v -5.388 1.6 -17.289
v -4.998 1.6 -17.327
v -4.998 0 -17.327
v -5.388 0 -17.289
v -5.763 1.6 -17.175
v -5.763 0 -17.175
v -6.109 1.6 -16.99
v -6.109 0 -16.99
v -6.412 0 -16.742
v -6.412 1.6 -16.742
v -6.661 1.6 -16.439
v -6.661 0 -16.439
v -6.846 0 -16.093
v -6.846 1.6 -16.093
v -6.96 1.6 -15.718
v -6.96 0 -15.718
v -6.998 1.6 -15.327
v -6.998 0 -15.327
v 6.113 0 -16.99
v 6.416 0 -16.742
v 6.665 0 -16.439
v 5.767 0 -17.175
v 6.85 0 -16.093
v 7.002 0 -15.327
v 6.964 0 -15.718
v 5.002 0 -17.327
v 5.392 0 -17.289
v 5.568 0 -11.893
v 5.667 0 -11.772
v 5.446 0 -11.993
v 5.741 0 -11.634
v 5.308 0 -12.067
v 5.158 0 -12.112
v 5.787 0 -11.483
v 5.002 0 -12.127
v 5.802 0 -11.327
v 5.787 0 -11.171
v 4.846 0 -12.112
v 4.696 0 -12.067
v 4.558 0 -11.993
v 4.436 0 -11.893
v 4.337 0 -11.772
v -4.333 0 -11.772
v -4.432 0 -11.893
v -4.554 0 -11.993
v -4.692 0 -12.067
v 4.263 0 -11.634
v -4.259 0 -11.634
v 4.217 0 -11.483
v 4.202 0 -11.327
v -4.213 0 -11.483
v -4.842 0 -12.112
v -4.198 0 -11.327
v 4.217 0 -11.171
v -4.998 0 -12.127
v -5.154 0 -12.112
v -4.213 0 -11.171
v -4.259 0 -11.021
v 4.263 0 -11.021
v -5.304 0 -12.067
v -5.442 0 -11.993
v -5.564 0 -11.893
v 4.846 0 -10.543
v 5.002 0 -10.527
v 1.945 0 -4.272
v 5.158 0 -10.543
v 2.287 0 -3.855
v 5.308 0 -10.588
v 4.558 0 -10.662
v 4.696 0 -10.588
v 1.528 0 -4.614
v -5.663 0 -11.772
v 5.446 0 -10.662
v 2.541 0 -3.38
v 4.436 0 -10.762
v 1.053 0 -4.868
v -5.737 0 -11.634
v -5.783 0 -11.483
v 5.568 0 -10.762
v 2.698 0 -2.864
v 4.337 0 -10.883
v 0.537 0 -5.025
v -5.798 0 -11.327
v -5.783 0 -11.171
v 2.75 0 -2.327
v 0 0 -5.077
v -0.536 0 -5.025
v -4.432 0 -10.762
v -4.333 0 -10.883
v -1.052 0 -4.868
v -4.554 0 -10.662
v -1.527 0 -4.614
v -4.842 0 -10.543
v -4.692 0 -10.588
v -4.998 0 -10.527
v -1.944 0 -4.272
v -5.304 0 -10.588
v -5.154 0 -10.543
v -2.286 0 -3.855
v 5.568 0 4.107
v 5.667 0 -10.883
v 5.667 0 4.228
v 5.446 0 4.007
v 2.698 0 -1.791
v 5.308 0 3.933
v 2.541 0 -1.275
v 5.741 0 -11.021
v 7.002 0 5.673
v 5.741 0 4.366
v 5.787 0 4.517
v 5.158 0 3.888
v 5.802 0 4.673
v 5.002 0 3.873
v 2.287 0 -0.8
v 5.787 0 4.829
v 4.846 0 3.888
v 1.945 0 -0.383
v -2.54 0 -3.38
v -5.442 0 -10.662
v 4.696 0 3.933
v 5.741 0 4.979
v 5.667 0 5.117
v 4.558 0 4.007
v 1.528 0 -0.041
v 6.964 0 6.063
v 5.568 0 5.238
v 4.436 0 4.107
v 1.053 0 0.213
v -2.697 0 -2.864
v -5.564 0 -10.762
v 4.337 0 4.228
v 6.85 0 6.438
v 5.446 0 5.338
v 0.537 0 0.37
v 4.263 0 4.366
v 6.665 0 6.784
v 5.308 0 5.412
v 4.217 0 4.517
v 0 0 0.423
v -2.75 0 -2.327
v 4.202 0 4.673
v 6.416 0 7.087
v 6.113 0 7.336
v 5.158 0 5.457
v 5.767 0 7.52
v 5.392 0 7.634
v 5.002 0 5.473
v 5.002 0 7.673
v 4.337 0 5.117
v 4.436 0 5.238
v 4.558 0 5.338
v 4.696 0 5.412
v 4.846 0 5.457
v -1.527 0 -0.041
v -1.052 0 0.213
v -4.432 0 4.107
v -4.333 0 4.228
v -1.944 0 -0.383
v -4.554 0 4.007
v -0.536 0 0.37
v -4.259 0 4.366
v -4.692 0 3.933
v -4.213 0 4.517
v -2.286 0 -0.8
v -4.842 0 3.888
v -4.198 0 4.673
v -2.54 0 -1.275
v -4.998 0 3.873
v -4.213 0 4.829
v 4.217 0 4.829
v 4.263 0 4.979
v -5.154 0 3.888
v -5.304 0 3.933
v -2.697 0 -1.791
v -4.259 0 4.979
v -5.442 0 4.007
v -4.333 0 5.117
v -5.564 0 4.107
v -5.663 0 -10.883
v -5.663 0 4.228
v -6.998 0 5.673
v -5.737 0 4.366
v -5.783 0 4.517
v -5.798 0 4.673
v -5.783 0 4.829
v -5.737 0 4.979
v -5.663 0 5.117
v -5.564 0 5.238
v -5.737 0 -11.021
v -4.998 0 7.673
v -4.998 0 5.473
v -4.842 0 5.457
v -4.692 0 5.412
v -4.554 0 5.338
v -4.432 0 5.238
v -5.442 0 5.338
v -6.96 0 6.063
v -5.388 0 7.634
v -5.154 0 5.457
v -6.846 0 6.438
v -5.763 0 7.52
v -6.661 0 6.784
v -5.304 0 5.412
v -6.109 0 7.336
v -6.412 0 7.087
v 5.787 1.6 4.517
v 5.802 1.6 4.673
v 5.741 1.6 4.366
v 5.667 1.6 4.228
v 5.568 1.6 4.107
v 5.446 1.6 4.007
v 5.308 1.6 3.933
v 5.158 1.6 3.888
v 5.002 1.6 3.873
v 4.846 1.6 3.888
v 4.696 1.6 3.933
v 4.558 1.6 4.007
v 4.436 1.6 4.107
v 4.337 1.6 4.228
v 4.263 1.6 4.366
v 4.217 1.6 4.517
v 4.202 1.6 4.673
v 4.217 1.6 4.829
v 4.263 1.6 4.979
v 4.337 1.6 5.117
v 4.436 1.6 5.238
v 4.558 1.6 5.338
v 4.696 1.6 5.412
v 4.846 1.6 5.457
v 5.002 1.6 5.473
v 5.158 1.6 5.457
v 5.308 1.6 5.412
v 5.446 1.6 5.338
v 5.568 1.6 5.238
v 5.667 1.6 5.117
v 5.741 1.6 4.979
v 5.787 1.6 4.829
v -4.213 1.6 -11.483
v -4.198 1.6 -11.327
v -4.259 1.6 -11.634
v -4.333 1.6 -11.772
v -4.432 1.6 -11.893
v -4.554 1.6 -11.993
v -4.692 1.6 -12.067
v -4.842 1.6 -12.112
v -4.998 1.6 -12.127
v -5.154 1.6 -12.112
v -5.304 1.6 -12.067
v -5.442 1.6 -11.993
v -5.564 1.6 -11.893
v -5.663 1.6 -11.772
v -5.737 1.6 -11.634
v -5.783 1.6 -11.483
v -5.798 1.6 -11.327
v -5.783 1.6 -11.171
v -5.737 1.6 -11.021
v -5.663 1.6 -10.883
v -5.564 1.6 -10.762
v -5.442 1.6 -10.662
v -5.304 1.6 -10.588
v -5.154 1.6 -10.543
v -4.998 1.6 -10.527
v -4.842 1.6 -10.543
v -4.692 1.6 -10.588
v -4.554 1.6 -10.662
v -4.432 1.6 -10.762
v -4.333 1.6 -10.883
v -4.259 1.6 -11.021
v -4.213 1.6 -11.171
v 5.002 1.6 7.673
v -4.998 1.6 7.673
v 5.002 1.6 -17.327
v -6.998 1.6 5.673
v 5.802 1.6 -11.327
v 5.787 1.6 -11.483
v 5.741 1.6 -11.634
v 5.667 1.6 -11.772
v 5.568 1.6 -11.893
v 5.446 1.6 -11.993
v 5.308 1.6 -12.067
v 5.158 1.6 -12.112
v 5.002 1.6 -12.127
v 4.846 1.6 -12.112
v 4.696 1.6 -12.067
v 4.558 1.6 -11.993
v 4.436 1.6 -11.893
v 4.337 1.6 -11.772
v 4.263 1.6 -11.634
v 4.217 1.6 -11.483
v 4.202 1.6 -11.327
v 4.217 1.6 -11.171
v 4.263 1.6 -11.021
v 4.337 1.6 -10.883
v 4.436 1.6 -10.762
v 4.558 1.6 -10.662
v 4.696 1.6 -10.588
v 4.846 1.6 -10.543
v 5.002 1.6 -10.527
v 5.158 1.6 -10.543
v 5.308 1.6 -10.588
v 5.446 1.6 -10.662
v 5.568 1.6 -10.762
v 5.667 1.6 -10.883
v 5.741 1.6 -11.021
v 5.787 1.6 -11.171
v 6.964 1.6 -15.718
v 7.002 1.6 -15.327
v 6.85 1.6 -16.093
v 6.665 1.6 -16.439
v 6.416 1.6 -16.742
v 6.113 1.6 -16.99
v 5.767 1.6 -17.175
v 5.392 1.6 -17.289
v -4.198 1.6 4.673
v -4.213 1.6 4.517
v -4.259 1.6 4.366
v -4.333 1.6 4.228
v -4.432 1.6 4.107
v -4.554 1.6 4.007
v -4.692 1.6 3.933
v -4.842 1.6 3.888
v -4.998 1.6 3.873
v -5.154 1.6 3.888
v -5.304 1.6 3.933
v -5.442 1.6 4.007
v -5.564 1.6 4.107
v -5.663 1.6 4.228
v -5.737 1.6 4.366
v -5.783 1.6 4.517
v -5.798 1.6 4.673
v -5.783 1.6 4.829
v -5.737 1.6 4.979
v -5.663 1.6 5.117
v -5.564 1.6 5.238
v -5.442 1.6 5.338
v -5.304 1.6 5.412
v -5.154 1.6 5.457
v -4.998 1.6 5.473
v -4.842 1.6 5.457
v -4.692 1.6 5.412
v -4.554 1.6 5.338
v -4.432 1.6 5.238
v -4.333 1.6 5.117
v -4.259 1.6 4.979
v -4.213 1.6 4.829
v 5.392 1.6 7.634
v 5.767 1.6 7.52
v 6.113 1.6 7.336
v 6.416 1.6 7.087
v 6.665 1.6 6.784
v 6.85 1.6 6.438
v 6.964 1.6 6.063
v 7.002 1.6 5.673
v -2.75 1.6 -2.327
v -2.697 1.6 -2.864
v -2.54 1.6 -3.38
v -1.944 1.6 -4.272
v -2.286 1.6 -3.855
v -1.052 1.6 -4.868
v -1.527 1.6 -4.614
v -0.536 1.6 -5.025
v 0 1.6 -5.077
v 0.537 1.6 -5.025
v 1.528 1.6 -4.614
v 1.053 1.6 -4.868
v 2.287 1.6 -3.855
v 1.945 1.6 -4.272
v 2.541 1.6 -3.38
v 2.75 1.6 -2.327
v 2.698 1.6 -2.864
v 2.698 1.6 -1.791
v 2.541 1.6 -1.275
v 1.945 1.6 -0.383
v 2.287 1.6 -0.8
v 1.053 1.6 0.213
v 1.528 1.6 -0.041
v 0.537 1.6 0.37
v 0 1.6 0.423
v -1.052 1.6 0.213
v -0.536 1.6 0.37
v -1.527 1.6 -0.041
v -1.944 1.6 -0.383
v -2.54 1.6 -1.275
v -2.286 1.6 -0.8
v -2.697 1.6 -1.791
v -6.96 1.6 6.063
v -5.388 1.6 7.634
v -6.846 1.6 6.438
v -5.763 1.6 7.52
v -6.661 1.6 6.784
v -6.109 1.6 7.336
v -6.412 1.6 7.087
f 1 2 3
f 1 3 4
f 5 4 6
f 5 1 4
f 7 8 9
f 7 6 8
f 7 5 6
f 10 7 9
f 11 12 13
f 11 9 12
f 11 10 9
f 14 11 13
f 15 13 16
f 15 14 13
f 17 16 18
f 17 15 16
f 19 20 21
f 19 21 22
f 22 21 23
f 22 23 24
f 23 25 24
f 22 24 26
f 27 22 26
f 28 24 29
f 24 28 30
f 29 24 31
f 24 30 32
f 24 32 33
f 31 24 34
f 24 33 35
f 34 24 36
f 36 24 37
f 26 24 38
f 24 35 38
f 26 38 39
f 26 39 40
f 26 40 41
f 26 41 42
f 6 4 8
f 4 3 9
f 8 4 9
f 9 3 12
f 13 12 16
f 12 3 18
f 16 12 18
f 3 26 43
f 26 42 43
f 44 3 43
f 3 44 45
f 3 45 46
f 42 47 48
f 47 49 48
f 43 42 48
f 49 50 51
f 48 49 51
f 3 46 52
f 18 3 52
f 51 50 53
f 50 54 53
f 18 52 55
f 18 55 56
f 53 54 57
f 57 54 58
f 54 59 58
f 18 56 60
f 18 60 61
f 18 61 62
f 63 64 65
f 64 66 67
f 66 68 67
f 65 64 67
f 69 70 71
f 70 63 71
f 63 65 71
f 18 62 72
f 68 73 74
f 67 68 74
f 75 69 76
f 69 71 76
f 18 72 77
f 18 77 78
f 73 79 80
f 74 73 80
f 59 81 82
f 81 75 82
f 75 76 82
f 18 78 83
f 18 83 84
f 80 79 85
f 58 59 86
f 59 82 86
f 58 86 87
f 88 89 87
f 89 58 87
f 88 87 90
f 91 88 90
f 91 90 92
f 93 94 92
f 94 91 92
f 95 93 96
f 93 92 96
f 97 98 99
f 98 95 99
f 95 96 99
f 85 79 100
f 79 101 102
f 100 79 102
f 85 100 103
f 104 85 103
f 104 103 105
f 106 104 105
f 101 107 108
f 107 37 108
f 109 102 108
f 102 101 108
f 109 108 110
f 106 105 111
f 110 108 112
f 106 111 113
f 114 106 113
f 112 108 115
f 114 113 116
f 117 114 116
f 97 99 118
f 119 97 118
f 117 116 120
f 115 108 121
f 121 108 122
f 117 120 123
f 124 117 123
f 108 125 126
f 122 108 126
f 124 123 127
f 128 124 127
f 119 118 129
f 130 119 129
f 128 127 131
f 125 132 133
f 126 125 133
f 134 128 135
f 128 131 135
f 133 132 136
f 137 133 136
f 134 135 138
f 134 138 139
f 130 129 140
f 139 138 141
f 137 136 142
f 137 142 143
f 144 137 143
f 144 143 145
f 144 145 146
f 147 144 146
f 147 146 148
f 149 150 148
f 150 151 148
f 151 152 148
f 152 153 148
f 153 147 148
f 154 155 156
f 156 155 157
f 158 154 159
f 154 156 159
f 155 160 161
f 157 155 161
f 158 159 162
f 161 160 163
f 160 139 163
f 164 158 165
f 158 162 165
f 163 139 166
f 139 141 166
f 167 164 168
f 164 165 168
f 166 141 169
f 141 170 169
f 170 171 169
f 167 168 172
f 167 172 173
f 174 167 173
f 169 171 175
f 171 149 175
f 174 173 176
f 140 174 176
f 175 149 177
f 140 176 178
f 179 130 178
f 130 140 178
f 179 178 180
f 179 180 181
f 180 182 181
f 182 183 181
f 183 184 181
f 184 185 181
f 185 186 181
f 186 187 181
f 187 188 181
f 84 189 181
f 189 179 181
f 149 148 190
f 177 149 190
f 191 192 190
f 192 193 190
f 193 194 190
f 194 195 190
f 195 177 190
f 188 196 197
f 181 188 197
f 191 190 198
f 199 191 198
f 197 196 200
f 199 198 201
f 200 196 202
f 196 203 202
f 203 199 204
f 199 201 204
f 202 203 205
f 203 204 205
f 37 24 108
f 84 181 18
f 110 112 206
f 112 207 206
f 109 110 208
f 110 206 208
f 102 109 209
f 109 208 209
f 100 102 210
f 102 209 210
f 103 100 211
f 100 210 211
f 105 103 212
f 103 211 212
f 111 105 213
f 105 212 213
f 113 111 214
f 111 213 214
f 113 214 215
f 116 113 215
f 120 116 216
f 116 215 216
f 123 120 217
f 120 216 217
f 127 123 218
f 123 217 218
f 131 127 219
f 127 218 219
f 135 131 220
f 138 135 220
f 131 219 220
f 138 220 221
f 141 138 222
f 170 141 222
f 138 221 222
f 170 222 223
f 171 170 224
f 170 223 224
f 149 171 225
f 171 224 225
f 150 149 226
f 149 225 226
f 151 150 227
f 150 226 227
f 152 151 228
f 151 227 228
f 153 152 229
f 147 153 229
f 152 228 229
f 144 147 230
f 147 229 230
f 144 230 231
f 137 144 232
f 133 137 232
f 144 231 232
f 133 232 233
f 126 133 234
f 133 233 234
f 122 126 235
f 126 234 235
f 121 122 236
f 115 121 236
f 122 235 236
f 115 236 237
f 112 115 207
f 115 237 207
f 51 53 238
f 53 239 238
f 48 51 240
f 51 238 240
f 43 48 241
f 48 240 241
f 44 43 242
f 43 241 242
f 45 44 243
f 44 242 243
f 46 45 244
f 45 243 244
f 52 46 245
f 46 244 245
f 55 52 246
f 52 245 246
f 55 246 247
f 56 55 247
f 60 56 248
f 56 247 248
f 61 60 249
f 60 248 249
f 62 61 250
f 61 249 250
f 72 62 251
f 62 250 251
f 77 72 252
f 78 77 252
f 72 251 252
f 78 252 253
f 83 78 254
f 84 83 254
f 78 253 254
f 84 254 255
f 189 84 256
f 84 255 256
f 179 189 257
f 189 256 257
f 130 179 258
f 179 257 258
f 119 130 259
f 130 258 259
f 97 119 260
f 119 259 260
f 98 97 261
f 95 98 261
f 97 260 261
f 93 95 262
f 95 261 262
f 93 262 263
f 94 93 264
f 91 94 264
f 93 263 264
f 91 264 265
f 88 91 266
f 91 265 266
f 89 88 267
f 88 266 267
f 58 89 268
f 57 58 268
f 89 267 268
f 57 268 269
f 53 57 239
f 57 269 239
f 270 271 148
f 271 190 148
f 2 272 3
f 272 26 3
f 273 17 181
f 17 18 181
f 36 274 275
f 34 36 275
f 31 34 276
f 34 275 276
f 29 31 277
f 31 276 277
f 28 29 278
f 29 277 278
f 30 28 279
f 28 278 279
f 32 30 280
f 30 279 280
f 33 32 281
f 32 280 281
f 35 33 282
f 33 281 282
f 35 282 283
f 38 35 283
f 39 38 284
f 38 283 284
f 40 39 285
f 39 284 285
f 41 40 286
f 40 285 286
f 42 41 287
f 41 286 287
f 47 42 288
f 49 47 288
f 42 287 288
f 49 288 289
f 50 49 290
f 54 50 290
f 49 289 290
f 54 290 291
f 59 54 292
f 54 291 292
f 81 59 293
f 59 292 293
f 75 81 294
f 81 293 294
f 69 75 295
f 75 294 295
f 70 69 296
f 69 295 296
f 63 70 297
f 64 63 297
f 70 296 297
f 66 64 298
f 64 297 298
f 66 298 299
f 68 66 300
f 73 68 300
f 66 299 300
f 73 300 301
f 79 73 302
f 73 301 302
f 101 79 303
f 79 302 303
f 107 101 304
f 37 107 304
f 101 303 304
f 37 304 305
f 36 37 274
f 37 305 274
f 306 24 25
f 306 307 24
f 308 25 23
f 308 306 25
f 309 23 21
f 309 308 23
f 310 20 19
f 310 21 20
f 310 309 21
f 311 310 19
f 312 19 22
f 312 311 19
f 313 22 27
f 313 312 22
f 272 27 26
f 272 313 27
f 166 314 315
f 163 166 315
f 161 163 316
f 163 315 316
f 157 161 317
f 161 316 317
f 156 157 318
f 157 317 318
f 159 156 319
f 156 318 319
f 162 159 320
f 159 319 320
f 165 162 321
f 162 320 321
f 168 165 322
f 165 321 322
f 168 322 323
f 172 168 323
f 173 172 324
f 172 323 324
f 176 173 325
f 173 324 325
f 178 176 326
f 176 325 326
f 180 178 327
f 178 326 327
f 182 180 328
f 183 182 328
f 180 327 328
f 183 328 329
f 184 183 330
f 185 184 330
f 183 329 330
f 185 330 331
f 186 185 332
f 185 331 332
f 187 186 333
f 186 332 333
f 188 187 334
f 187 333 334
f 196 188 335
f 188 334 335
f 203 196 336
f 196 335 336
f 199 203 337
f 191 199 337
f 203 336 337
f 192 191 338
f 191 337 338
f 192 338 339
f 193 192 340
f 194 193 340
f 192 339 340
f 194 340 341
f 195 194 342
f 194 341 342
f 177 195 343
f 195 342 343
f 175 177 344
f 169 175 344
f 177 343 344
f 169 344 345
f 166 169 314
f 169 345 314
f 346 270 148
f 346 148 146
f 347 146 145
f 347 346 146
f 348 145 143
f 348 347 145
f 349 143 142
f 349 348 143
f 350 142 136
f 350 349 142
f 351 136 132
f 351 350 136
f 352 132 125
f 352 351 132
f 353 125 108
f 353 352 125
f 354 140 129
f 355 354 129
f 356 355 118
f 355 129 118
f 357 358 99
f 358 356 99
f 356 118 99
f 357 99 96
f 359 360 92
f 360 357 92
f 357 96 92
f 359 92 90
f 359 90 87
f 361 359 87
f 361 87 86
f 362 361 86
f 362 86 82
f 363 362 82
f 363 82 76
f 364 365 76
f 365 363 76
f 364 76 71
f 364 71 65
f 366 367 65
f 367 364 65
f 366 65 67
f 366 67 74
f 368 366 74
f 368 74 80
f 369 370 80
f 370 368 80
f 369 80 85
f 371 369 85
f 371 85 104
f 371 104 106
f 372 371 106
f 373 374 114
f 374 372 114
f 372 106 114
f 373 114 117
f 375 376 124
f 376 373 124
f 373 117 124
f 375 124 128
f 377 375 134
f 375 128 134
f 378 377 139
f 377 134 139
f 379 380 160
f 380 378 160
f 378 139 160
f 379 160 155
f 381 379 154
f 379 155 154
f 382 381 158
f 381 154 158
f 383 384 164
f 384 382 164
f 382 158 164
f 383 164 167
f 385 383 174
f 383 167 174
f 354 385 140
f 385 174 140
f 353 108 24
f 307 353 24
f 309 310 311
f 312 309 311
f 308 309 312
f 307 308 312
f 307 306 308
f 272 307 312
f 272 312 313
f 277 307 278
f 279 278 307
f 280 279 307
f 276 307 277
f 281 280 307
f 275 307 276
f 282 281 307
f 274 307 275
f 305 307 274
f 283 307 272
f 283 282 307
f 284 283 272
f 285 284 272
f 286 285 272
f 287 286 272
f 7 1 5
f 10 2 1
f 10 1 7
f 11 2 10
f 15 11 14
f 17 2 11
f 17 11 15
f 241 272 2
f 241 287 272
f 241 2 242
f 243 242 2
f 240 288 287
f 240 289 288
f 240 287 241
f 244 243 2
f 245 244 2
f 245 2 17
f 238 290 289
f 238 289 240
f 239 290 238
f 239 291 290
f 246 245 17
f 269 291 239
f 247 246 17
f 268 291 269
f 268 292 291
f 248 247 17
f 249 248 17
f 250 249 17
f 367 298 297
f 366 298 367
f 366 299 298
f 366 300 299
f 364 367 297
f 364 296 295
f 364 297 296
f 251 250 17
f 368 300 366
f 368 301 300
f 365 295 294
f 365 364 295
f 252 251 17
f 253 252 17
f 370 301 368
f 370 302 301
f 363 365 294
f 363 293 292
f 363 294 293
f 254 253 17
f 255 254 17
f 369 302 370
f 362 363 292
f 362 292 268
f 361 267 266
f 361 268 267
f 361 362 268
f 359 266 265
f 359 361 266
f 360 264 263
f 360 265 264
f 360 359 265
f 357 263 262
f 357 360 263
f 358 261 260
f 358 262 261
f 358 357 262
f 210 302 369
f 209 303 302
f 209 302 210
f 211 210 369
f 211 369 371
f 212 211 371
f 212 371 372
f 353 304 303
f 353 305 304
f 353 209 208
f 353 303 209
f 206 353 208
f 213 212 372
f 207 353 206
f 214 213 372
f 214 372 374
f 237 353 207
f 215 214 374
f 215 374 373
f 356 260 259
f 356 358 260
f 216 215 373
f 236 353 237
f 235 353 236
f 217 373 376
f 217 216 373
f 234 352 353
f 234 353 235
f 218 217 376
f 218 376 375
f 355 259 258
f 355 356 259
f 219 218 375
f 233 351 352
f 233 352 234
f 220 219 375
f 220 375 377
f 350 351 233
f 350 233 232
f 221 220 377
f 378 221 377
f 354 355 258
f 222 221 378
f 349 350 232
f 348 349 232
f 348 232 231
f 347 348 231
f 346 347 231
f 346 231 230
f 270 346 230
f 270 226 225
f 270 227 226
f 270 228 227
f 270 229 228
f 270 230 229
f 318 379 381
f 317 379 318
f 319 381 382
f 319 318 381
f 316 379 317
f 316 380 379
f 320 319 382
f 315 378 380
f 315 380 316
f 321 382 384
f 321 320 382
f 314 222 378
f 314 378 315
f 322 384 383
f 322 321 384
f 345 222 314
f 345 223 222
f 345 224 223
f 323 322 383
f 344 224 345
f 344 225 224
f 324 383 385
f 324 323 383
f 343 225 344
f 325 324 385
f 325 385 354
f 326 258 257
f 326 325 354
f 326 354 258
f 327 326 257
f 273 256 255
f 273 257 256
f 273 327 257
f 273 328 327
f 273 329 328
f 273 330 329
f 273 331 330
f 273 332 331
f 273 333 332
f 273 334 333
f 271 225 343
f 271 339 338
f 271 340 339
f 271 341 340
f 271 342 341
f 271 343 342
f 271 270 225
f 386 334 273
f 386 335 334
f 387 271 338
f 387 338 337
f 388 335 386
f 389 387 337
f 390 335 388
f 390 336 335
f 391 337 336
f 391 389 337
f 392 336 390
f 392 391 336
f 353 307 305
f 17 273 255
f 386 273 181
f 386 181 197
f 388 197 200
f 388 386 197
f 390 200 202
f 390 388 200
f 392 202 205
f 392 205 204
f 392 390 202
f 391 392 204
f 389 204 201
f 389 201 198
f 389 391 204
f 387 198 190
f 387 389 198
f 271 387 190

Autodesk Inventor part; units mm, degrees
ref_plane "YZ Plane" through (0, 0, 0) normal (1, 0, 0) x (0, 1, 0)
ref_plane "XZ Plane" through (0, 0, 0) normal (0, 1, 0) x (-1, 0, 0)
ref_plane "XY Plane" through (0, 0, 0) normal (0, 0, 1) x (1, 0, 0)
sketch "Sketch1" plane through (0, 0, 0) normal (0, 1, 0) x (-1, 0, 0)
  line L0 (-4.5005, -6.5) -> (-3.283, -6.5)
  line L1 (-3.283, -6.5) -> (-2.9693, -6.948)
  line L2 (-2.9693, -6.948) -> (-2.9693, -8.2299)
  line L3 (-2.9693, -8.2299) -> (-2.0718, -8.2299)
  line L4 (-2.0718, -8.2299) -> (-2.0718, -7.0351)
  line L5 (-2.0718, -7.0351) -> (-1.8086, -6.5)
  line L6 (-1.8086, -6.5) -> (-0.6909, -6.5)
  line L7 (-0.6909, -6.5) -> (-0.4278, -7.0351)
  line L8 (-0.4278, -7.0351) -> (-0.4278, -8.2299)
  line L9 (-0.4278, -8.2299) -> (0.4698, -8.2299)
  line L10 (0.4698, -8.2299) -> (0.4698, -6.948)
  line L11 (0.4698, -6.948) -> (0.7835, -6.5)
  line L12 (0.7835, -6.5) -> (1.8077, -6.5)
  line L13 (1.8077, -6.5) -> (2.0708, -7.0351)
  line L14 (2.0708, -7.0351) -> (2.0708, -8.2299)
  line L15 (2.0708, -8.2299) -> (2.9683, -8.2299)
  line L16 (2.9683, -8.2299) -> (2.9683, -6.948)
  line L17 (2.9683, -6.948) -> (3.2821, -6.5)
  line L18 (3.2821, -6.5) -> (4.4995, -6.5)
  line L19 (4.4995, -6.5) -> (5.4995, -5.5)
  line L20 (5.4995, -5.5) -> (5.4995, 1.9247)
  line L21 (5.4995, 1.9247) -> (2.4995, 5.5)
  line L22 (2.4995, 5.5) -> (0.4698, 5.5)
  line L23 (0.4698, 5.5) -> (0.4698, 6.6191)
  line L24 (0.4698, 6.6191) -> (-0.4278, 6.6191)
  line L25 (-0.4278, 6.6191) -> (-0.4278, 5.5)
  line L26 (-0.4278, 5.5) -> (-2.5005, 5.5)
  line L27 (-2.5005, 5.5) -> (-5.5005, 1.9247)
  line L28 (-5.5005, 1.9247) -> (-5.5005, -5.5)
  line L29 (-5.5005, -5.5) -> (-4.5005, -6.5)
  circle A0 centre (-0.0005, -2.3274) radius 0.7145
  line L30 (6.998, 7.6726) -> (-7.002, 7.6726)
  line L31 (-7.002, 7.6726) -> (-7.002, -17.3274)
  line L32 (-7.002, -17.3274) -> (6.998, -17.3274)
  line L33 (6.998, -17.3274) -> (6.998, 7.6726)
  circle A1 centre (-0.0005, -2.3274) radius 2.75
  line L34 (-0.002, -21.2436) -> (-0.002, 13.4129) construction
  point P0 (-0.002, -0.846)
  dimension "d0" = 14
  dimension "d1" = 25
  dimension "d2" = 5.5
  dimension "d19" = 7
  dimension "d22" = 10
extrude "Extrusion1" add sketch "Sketch1" along normal blind 1.6 contours L29 L28 L27 L26 L25 L24 L23 L22 L21 L20 L19 L18 L17 L16 L15 L14 L13 L12 L11 L10 L9 L8 L7 L6 L5 L4 L3 L2 L1 L0 | L33 L32 L31 L30
sketch "Sketch2" plane through (0, 1.6, 0) normal (0, 1, 0) x (1, 0, 0)
  line L0 (-6.998, 17.3274) -> (-6.998, -7.6726) projected
  line L1 (7.002, 17.3274) -> (-6.998, 17.3274) projected
  line L2 (-6.998, -7.6726) -> (7.002, -7.6726)
  line L3 (7.002, -7.6726) -> (7.002, 17.3274)
  line L4 (7.002, 17.3274) -> (-6.998, 17.3274)
  line L5 (-6.998, 17.3274) -> (-6.998, -7.6726)
  circle A0 centre (5.002, -4.6726) radius 0.8
  circle A1 centre (5.002, 11.3274) radius 0.8
  circle A2 centre (-4.998, 11.3274) radius 0.8
  circle A3 centre (-4.998, -4.6726) radius 0.8
  point P0 (0, 0)
  dimension "d5" = 1.6
  dimension "d6" = 1.6
  dimension "d7" = 1.6
  dimension "d8" = 1.6
  dimension "d9" = 2
  dimension "d10" = 3
  dimension "d11" = 3
  dimension "d12" = 2
  dimension "d13" = 2
  dimension "d15" = 2
  dimension "d20" = 16
  dimension "d21" = 16
extrude "Extrusion2" cut sketch "Sketch2" against normal blind 1.6 contours A0 | A1 | A2 | A3
fillet "Fillet1" radius 2 4 edges at (-6.998, 0.8, 7.6726) (7.002, 0.8, 7.6726) (-6.998, 0.8, -17.3274) (7.002, 0.8, -17.3274)
equation "\"d19\" = 0.5 * d0"
equation "\"d5\" = d7"
equation "\"d6\" = d7"
equation "\"d8\" = d7"
equation "\"d10\" = d11"
equation "\"d20\" = d21"
properties part number "potentiometerpcb"
